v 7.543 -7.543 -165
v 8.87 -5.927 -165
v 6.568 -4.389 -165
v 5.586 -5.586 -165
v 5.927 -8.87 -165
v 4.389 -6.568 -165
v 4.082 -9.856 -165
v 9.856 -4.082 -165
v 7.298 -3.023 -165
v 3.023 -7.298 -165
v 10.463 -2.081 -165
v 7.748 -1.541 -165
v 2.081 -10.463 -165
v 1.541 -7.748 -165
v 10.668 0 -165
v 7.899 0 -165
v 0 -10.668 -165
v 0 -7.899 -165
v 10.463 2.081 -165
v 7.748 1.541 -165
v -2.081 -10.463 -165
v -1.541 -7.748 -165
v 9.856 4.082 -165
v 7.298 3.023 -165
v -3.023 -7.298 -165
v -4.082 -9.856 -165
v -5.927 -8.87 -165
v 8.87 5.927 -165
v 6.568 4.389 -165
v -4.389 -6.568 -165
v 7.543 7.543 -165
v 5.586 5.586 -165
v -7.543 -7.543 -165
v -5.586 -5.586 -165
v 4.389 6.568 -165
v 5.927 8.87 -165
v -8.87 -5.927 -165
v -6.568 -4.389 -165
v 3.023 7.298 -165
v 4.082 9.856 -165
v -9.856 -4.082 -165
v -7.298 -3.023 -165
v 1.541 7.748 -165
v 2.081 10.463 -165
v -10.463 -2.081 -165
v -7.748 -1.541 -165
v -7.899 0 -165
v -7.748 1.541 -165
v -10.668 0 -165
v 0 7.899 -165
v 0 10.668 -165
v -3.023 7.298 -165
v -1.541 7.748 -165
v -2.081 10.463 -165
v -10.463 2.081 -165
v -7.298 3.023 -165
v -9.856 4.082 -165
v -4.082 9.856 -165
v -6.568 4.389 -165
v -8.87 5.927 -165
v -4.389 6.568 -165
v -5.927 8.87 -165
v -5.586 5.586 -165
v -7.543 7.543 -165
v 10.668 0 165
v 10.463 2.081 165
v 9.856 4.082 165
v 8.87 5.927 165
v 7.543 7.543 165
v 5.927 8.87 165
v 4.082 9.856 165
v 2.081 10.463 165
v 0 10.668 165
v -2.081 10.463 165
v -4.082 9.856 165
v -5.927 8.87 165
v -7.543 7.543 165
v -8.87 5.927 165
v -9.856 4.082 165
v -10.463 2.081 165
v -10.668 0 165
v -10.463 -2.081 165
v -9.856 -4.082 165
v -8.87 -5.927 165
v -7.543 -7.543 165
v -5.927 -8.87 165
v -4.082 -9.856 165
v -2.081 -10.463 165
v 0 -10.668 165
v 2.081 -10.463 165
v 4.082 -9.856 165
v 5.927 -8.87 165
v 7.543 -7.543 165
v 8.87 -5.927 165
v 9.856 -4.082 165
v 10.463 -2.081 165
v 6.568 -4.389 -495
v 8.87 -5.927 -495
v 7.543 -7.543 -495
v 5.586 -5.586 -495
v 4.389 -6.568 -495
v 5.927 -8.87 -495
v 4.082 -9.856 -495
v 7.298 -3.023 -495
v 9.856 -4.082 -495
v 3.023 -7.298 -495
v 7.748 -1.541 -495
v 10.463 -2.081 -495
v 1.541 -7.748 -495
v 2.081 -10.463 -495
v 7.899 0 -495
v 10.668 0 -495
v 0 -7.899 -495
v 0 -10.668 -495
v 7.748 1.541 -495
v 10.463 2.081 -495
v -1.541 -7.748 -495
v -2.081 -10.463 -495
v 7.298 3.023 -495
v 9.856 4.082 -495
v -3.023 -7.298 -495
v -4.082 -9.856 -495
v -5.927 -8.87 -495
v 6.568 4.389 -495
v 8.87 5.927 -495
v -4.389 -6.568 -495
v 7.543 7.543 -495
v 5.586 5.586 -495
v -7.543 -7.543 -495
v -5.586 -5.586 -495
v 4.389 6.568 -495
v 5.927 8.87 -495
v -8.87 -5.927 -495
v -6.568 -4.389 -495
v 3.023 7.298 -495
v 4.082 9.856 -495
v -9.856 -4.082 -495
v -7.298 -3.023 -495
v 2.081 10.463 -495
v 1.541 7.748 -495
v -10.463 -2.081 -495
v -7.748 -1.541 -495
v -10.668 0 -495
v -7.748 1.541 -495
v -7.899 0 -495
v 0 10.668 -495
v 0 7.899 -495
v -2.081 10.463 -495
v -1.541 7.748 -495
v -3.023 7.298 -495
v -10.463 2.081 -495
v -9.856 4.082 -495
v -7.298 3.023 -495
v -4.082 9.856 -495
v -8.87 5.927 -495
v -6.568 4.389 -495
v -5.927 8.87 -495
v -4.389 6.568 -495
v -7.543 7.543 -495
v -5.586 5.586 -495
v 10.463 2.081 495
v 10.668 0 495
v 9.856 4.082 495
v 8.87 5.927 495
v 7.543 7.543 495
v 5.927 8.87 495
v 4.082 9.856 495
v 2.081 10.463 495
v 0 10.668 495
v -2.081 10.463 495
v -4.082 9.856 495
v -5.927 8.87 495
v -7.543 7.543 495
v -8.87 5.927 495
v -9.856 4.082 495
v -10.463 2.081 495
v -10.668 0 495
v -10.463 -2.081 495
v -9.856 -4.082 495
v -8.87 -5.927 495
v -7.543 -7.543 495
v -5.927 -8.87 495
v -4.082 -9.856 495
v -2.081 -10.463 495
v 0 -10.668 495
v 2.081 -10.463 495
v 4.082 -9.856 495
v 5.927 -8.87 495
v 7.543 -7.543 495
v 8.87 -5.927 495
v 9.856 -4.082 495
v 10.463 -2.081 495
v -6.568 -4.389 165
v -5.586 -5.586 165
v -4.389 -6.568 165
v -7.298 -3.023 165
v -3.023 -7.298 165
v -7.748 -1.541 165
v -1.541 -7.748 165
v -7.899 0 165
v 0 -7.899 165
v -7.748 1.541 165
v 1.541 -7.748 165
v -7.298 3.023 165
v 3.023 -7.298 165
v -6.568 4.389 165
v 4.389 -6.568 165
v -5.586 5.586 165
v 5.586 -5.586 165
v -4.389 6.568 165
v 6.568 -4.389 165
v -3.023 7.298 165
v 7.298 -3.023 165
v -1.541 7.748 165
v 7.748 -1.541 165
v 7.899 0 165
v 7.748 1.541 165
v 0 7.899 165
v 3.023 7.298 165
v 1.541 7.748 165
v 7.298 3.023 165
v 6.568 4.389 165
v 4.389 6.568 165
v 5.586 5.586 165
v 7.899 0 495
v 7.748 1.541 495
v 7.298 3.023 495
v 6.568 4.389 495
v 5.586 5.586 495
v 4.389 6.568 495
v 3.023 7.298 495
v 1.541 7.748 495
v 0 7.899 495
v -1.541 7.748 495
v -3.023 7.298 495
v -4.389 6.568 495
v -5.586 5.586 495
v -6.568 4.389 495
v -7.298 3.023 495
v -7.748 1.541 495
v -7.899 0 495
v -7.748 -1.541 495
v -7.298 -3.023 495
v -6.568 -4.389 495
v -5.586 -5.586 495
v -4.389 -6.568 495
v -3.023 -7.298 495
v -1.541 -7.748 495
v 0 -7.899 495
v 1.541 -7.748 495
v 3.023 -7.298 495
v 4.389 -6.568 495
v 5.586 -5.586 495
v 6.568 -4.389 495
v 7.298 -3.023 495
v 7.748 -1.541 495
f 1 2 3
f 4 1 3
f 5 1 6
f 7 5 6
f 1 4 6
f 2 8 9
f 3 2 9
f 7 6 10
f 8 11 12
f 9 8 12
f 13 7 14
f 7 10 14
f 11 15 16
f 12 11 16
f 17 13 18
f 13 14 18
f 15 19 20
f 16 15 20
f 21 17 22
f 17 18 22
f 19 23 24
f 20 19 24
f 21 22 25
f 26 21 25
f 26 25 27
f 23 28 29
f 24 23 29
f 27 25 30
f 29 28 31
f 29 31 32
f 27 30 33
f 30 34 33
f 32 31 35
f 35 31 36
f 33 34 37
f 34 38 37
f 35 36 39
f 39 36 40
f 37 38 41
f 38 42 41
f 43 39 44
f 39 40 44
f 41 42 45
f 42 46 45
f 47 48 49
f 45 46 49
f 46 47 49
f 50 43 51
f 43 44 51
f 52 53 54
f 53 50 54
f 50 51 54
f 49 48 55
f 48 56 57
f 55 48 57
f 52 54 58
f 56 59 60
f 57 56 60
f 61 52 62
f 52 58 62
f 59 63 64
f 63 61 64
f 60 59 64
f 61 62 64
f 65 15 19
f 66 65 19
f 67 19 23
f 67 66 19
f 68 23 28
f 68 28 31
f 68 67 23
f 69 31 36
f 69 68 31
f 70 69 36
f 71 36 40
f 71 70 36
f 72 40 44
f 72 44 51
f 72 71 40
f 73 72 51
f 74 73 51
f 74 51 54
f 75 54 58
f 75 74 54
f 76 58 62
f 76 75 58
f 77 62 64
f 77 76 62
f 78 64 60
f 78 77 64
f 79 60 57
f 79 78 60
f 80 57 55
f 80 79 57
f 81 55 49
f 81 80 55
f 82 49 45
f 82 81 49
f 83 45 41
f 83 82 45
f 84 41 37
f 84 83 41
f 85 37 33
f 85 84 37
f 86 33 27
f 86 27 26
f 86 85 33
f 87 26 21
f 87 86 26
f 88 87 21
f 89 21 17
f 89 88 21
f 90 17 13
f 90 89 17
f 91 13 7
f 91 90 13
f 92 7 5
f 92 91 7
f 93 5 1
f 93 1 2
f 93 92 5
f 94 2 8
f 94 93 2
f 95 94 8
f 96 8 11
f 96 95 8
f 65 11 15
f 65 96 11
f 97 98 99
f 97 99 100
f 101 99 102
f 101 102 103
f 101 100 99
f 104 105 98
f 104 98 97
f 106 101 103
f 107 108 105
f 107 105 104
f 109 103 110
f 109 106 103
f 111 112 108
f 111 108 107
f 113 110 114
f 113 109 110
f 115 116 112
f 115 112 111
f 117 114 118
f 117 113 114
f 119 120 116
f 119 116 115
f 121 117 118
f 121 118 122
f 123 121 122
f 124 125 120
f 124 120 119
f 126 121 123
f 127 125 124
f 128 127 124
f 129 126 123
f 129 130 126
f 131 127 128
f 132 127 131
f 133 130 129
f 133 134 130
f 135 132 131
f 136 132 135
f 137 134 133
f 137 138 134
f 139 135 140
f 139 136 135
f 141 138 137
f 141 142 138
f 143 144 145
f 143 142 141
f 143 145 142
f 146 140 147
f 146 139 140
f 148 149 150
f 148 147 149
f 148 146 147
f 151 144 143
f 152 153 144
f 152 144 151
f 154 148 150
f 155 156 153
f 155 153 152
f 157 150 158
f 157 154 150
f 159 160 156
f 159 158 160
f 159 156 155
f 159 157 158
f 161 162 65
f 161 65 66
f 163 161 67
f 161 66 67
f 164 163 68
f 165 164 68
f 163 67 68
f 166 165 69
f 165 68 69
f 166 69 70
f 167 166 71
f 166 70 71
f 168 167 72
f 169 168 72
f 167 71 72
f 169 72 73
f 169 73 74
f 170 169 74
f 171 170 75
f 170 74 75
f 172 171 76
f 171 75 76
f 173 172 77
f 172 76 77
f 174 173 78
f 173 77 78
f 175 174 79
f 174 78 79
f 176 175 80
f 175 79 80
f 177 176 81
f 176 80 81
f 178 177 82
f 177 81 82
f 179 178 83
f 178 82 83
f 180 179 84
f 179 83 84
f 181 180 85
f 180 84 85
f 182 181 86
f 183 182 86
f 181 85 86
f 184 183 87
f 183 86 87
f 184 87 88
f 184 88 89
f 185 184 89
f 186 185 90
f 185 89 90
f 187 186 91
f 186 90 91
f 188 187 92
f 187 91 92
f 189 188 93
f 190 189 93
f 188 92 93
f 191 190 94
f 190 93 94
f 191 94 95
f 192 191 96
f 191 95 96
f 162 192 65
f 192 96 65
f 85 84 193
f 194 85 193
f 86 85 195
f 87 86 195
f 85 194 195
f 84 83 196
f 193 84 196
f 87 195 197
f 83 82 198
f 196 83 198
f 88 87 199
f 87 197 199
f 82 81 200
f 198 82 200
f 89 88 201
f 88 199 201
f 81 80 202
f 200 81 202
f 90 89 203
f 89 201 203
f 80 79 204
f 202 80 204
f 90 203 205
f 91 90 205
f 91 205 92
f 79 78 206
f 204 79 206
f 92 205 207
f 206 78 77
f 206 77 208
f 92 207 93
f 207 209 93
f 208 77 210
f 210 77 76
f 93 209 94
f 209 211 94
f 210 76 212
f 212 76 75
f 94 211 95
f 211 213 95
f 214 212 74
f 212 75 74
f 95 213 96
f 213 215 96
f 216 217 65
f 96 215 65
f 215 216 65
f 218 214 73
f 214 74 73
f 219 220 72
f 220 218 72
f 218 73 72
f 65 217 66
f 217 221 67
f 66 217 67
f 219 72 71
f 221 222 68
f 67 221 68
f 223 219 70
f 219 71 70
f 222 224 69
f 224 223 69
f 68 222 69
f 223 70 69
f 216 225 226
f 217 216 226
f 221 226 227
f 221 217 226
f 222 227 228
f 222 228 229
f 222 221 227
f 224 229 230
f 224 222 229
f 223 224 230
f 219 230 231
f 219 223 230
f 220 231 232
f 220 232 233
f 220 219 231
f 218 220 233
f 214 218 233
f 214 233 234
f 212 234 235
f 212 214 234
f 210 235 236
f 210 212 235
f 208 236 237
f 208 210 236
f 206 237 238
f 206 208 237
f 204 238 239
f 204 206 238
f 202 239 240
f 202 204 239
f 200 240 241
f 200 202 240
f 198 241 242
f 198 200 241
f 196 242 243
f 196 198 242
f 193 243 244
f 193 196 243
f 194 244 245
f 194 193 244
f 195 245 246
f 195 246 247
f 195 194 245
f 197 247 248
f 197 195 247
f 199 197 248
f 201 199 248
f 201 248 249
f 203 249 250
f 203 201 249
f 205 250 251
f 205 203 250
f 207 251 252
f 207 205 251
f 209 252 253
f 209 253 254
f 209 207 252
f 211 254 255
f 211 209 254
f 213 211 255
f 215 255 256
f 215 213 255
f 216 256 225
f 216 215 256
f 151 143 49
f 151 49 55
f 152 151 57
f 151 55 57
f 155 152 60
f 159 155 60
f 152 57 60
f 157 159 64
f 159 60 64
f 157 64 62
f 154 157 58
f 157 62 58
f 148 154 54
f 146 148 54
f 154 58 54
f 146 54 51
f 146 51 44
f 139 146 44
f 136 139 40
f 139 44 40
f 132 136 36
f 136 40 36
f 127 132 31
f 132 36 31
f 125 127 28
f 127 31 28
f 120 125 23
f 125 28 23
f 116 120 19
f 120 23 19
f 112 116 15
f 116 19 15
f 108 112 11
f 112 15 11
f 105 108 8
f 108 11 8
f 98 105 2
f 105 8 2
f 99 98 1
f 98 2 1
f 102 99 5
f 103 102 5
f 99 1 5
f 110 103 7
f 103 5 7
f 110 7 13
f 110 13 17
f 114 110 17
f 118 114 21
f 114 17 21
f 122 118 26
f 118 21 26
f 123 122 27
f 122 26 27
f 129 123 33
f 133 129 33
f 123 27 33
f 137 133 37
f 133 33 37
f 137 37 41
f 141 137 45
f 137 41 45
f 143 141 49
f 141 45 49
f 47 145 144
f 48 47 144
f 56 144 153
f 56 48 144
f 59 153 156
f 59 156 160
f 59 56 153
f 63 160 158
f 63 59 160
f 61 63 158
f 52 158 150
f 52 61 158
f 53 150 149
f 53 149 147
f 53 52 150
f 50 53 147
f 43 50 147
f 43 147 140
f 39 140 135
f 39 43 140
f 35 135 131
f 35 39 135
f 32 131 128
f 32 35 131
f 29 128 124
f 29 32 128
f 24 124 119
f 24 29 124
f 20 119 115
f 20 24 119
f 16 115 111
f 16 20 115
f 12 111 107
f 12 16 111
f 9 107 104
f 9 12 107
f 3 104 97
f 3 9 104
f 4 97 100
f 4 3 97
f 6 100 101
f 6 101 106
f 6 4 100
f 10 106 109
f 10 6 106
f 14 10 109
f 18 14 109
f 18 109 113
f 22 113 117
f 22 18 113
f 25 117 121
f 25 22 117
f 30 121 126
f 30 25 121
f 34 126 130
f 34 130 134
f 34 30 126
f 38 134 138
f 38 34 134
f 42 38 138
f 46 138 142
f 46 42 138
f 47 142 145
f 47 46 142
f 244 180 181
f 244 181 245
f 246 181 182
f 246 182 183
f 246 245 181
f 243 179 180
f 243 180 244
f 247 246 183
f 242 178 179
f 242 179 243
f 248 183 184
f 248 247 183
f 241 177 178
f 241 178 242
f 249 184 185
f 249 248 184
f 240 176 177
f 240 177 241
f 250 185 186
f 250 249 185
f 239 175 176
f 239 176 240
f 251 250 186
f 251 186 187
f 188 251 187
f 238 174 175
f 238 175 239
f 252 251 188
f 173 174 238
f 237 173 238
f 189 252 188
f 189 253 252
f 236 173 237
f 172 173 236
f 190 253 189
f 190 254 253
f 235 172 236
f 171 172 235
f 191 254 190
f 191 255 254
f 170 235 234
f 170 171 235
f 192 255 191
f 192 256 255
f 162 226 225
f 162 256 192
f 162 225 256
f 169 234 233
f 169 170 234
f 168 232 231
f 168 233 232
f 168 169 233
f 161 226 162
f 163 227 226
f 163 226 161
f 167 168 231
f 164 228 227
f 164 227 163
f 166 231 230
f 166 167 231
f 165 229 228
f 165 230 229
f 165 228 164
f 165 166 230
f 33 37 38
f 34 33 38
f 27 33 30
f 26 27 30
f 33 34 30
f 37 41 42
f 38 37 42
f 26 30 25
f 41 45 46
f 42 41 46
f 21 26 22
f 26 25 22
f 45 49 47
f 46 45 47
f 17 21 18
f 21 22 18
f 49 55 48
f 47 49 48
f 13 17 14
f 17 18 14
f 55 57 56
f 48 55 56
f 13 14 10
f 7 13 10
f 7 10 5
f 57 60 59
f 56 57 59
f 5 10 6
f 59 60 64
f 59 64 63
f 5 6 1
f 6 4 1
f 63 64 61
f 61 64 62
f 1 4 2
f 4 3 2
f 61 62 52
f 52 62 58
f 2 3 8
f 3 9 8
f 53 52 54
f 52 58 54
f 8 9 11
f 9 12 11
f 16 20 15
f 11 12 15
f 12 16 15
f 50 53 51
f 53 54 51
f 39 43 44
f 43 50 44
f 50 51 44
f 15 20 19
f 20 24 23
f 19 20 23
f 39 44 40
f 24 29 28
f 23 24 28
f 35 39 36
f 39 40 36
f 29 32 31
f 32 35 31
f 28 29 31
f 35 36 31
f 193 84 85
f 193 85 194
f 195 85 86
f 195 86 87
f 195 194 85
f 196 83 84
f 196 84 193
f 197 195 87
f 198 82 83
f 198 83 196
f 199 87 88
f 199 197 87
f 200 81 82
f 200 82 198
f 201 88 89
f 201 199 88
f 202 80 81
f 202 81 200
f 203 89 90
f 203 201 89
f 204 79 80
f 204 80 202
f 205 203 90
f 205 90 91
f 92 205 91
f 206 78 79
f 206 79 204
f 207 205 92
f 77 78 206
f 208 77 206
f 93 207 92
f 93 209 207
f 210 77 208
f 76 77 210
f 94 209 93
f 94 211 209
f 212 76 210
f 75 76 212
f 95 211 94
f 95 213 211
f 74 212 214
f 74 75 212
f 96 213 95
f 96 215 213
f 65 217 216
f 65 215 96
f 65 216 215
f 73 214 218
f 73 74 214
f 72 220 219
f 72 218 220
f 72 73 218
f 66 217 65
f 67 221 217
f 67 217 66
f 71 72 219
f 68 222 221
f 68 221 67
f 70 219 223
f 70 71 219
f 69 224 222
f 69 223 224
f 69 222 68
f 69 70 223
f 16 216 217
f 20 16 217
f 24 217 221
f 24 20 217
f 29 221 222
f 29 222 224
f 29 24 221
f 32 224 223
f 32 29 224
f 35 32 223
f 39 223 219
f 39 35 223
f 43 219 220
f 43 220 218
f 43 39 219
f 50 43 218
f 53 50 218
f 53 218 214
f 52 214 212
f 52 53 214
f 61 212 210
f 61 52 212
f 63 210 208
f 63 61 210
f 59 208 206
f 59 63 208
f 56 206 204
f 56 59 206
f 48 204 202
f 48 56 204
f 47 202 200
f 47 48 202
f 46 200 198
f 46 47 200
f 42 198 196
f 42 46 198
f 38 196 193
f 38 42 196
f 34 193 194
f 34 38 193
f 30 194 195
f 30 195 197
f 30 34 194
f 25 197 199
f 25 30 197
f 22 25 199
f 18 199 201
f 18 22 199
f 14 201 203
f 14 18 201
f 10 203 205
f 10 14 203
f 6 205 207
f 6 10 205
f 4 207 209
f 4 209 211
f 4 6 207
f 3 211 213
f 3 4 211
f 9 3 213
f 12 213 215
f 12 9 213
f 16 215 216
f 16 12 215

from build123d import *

# Parameters (mm, degrees)
SKETCH1_R           = 10.668
SKETCH1_R_2         = 7.8994
EXTRUDE_THIN1_DEPTH = 165
SKETCH2_R           = 10.668
SKETCH2_R_2         = 7.8994
BOSS_EXTRUDE2_DEPTH = 330
SKETCH3_R           = 10.668
SKETCH3_R_2         = 7.8994
BOSS_EXTRUDE3_DEPTH = 330


with BuildPart() as part:
    # Sketch1 → Extrude-Thin1 (new, symmetric)
    with BuildSketch(Plane.XY):
        Circle(SKETCH1_R)
        Circle(SKETCH1_R_2, mode=Mode.SUBTRACT)
    extrude(amount=EXTRUDE_THIN1_DEPTH, both=True)


with BuildPart() as body_2:
    # Sketch2 → Boss-Extrude2 (new body)
    with BuildSketch(Plane.XY.offset(165)):
        Circle(SKETCH2_R)
        Circle(SKETCH2_R_2, mode=Mode.SUBTRACT)
    extrude(amount=BOSS_EXTRUDE2_DEPTH)


with BuildPart() as body_3:
    # Sketch3 → Boss-Extrude3 (new body)
    with BuildSketch(Plane(origin=(0, 0, -165), x_dir=(-1, 0, 0), z_dir=(0, 0, -1))):
        Circle(SKETCH3_R)
        Circle(SKETCH3_R_2, mode=Mode.SUBTRACT)
    extrude(amount=BOSS_EXTRUDE3_DEPTH)


solid = Compound([part.part, body_2.part, body_3.part])
